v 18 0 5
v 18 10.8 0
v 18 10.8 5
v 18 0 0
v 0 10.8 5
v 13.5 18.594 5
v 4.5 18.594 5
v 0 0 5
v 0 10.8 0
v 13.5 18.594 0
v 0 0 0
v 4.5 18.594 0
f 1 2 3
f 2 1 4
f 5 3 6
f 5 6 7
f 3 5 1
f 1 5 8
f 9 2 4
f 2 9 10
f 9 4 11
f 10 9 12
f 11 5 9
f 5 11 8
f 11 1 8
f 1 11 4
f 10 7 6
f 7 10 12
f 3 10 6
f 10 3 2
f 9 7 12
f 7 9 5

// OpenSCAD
$fn = 150;

union() {
	cube(size = [18.0, 10.799999999999999, 5]);
	translate(v = [0, 10.799999999999999, 0]) {
		translate(v = [9.0, 0, 0]) {
			cylinder($fn = 6, d = 18.0, h = 5);
		}
	}
}
